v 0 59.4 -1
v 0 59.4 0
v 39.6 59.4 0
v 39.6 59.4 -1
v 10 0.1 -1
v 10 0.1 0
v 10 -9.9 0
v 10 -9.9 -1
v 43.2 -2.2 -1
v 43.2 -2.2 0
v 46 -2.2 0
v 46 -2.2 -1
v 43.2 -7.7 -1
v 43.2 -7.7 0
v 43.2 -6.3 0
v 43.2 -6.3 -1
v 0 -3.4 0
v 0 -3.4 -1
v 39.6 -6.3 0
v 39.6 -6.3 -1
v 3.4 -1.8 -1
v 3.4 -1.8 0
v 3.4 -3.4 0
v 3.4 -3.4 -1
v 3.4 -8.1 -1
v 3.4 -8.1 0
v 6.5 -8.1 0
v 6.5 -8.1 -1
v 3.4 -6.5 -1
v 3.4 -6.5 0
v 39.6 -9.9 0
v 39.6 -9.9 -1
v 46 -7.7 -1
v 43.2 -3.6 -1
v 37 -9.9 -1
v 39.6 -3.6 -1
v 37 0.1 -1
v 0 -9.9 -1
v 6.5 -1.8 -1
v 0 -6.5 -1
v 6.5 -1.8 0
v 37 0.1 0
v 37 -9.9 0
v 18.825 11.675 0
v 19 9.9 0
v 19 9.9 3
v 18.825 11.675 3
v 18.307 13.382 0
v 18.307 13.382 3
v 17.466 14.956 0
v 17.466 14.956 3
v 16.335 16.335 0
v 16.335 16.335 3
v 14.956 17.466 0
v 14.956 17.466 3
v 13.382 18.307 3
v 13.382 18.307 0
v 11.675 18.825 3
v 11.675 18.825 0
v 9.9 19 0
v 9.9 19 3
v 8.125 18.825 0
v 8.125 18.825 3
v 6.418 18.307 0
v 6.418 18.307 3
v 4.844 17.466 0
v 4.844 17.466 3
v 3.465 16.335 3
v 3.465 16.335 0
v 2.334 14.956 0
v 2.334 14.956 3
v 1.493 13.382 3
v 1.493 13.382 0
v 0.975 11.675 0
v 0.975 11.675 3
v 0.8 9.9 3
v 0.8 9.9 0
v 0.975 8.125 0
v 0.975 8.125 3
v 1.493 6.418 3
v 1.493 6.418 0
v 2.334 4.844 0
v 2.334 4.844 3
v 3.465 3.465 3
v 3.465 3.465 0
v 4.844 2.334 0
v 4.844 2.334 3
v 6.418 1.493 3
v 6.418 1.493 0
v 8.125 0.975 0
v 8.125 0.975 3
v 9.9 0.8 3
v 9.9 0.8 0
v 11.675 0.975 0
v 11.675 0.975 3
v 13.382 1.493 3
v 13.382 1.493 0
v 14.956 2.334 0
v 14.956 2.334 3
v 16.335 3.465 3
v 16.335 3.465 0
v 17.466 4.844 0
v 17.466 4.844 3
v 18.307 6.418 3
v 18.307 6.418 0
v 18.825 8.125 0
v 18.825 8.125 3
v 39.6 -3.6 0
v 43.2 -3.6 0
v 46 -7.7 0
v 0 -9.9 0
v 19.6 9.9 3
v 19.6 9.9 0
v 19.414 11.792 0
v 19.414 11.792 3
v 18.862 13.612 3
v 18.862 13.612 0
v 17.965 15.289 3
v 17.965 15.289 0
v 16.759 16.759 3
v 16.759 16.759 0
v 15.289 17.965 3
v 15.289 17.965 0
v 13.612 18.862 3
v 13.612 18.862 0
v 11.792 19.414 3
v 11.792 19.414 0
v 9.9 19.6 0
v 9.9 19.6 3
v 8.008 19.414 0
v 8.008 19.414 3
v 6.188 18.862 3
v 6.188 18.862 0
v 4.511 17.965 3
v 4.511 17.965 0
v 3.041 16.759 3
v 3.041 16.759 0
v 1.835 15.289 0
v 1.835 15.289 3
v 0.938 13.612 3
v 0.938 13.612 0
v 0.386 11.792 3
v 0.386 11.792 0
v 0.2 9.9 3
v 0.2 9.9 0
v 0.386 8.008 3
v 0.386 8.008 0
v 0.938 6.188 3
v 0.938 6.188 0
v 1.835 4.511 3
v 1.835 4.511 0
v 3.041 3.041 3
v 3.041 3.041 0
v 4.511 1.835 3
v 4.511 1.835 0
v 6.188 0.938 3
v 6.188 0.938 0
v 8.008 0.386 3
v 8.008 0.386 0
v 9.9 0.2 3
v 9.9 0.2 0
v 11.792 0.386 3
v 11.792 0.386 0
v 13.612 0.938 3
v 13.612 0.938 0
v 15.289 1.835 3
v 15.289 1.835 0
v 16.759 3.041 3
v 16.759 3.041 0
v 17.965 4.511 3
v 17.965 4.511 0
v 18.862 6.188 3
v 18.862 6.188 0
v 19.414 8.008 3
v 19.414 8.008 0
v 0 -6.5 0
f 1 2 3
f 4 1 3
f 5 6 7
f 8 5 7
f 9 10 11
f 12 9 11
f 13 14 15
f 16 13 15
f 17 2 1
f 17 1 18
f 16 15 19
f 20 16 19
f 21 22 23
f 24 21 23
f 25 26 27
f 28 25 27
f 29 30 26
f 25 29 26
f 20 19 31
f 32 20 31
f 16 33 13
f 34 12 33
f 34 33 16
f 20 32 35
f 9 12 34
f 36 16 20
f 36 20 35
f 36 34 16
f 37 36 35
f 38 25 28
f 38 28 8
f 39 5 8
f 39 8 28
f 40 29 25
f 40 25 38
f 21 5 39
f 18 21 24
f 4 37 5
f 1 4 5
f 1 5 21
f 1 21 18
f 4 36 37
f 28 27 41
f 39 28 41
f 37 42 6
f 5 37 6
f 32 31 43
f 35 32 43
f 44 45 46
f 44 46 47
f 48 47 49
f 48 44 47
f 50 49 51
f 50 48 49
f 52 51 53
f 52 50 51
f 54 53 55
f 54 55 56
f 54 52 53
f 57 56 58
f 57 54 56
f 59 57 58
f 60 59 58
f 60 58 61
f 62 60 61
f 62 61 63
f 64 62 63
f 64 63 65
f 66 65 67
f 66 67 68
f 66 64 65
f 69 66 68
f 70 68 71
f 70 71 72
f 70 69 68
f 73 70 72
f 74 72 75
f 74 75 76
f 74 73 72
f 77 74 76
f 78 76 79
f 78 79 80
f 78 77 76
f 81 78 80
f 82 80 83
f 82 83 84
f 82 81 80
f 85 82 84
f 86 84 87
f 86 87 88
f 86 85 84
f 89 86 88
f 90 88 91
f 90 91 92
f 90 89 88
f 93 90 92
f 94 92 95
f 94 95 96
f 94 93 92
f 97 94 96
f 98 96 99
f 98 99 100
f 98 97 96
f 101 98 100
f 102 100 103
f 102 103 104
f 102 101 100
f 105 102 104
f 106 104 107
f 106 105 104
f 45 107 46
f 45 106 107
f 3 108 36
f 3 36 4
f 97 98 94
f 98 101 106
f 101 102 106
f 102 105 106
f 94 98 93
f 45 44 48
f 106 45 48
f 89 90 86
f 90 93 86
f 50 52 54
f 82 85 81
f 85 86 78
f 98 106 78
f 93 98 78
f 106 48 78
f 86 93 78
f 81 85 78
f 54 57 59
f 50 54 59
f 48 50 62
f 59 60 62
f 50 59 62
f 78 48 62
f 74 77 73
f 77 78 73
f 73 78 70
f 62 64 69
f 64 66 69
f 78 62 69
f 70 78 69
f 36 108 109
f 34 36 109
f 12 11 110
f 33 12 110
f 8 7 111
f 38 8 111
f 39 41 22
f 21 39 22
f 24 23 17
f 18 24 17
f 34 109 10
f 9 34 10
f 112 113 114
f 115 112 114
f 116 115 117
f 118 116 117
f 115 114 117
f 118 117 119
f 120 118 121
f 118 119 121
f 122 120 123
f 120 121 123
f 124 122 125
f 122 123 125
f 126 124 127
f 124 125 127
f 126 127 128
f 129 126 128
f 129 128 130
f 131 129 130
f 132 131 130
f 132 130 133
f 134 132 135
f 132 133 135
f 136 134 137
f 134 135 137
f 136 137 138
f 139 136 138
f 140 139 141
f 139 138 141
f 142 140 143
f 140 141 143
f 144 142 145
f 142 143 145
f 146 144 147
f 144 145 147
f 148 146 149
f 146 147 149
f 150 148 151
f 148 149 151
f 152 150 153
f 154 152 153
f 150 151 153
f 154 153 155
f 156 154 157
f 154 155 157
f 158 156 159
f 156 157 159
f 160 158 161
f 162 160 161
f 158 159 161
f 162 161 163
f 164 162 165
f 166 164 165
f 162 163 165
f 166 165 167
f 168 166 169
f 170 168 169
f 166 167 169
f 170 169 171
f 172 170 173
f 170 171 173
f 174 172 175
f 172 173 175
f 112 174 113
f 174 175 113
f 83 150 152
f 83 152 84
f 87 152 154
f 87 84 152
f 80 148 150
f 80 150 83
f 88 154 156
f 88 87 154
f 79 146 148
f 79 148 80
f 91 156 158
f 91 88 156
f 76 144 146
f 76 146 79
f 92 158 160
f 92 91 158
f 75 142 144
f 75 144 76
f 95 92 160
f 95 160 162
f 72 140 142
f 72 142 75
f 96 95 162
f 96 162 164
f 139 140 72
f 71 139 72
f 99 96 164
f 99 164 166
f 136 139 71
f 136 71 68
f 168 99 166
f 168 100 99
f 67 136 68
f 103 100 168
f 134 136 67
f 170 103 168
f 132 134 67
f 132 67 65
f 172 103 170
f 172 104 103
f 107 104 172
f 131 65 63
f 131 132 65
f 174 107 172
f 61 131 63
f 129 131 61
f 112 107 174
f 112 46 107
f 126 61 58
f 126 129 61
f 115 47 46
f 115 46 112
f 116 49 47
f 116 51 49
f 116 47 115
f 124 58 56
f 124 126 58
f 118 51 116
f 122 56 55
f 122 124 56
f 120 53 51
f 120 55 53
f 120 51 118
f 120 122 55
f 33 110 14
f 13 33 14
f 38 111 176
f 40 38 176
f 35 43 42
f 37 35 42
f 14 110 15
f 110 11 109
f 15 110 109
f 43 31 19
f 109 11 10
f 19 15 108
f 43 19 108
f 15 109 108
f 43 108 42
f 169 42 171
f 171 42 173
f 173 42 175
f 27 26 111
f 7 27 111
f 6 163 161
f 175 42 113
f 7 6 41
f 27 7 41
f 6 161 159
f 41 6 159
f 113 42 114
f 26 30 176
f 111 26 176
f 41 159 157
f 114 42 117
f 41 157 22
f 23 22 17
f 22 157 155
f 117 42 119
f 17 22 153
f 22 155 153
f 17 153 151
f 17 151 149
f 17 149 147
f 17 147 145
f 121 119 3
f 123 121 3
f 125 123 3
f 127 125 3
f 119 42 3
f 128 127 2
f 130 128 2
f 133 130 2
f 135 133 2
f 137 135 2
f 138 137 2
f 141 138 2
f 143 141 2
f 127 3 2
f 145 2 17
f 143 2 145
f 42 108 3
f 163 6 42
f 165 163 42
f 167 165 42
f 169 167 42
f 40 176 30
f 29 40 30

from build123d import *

# Parameters (mm, degrees)
PAD_DEPTH     = 1
SKETCH001_R   = 9.7
SKETCH001_R_2 = 9.1
PAD001_DEPTH  = 3


with BuildPart() as part:
    # Sketch → Pad (new body)
    with BuildSketch(Plane.XY):
        Polygon((10, 0.1), (10, -9.9), (0, -9.9), (0, -6.5), (3.4, -6.5), (3.4, -8.1), (6.5, -8.1), (6.5, -1.8), (3.4, -1.8), (3.4, -3.4), (0, -3.4), (0, 0), (0, 59.4), (39.6, 59.4), (39.6, 0), (39.6, -3.6), (43.2, -3.6), (43.2, -2.2), (46, -2.2), (46, -7.7), (43.2, -7.7), (43.2, -6.3), (39.6, -6.3), (39.6, -9.9), (37, -9.9), (37, 0.1), align=None)
    extrude(amount=-PAD_DEPTH)

    # Sketch001 → Pad001 (join)
    with BuildSketch(Plane.XY):
        with Locations((9.9, 9.9)):
            Circle(SKETCH001_R)
        with Locations((9.9, 9.9)):
            Circle(SKETCH001_R_2, mode=Mode.SUBTRACT)
    extrude(amount=PAD001_DEPTH)


solid = part.part
